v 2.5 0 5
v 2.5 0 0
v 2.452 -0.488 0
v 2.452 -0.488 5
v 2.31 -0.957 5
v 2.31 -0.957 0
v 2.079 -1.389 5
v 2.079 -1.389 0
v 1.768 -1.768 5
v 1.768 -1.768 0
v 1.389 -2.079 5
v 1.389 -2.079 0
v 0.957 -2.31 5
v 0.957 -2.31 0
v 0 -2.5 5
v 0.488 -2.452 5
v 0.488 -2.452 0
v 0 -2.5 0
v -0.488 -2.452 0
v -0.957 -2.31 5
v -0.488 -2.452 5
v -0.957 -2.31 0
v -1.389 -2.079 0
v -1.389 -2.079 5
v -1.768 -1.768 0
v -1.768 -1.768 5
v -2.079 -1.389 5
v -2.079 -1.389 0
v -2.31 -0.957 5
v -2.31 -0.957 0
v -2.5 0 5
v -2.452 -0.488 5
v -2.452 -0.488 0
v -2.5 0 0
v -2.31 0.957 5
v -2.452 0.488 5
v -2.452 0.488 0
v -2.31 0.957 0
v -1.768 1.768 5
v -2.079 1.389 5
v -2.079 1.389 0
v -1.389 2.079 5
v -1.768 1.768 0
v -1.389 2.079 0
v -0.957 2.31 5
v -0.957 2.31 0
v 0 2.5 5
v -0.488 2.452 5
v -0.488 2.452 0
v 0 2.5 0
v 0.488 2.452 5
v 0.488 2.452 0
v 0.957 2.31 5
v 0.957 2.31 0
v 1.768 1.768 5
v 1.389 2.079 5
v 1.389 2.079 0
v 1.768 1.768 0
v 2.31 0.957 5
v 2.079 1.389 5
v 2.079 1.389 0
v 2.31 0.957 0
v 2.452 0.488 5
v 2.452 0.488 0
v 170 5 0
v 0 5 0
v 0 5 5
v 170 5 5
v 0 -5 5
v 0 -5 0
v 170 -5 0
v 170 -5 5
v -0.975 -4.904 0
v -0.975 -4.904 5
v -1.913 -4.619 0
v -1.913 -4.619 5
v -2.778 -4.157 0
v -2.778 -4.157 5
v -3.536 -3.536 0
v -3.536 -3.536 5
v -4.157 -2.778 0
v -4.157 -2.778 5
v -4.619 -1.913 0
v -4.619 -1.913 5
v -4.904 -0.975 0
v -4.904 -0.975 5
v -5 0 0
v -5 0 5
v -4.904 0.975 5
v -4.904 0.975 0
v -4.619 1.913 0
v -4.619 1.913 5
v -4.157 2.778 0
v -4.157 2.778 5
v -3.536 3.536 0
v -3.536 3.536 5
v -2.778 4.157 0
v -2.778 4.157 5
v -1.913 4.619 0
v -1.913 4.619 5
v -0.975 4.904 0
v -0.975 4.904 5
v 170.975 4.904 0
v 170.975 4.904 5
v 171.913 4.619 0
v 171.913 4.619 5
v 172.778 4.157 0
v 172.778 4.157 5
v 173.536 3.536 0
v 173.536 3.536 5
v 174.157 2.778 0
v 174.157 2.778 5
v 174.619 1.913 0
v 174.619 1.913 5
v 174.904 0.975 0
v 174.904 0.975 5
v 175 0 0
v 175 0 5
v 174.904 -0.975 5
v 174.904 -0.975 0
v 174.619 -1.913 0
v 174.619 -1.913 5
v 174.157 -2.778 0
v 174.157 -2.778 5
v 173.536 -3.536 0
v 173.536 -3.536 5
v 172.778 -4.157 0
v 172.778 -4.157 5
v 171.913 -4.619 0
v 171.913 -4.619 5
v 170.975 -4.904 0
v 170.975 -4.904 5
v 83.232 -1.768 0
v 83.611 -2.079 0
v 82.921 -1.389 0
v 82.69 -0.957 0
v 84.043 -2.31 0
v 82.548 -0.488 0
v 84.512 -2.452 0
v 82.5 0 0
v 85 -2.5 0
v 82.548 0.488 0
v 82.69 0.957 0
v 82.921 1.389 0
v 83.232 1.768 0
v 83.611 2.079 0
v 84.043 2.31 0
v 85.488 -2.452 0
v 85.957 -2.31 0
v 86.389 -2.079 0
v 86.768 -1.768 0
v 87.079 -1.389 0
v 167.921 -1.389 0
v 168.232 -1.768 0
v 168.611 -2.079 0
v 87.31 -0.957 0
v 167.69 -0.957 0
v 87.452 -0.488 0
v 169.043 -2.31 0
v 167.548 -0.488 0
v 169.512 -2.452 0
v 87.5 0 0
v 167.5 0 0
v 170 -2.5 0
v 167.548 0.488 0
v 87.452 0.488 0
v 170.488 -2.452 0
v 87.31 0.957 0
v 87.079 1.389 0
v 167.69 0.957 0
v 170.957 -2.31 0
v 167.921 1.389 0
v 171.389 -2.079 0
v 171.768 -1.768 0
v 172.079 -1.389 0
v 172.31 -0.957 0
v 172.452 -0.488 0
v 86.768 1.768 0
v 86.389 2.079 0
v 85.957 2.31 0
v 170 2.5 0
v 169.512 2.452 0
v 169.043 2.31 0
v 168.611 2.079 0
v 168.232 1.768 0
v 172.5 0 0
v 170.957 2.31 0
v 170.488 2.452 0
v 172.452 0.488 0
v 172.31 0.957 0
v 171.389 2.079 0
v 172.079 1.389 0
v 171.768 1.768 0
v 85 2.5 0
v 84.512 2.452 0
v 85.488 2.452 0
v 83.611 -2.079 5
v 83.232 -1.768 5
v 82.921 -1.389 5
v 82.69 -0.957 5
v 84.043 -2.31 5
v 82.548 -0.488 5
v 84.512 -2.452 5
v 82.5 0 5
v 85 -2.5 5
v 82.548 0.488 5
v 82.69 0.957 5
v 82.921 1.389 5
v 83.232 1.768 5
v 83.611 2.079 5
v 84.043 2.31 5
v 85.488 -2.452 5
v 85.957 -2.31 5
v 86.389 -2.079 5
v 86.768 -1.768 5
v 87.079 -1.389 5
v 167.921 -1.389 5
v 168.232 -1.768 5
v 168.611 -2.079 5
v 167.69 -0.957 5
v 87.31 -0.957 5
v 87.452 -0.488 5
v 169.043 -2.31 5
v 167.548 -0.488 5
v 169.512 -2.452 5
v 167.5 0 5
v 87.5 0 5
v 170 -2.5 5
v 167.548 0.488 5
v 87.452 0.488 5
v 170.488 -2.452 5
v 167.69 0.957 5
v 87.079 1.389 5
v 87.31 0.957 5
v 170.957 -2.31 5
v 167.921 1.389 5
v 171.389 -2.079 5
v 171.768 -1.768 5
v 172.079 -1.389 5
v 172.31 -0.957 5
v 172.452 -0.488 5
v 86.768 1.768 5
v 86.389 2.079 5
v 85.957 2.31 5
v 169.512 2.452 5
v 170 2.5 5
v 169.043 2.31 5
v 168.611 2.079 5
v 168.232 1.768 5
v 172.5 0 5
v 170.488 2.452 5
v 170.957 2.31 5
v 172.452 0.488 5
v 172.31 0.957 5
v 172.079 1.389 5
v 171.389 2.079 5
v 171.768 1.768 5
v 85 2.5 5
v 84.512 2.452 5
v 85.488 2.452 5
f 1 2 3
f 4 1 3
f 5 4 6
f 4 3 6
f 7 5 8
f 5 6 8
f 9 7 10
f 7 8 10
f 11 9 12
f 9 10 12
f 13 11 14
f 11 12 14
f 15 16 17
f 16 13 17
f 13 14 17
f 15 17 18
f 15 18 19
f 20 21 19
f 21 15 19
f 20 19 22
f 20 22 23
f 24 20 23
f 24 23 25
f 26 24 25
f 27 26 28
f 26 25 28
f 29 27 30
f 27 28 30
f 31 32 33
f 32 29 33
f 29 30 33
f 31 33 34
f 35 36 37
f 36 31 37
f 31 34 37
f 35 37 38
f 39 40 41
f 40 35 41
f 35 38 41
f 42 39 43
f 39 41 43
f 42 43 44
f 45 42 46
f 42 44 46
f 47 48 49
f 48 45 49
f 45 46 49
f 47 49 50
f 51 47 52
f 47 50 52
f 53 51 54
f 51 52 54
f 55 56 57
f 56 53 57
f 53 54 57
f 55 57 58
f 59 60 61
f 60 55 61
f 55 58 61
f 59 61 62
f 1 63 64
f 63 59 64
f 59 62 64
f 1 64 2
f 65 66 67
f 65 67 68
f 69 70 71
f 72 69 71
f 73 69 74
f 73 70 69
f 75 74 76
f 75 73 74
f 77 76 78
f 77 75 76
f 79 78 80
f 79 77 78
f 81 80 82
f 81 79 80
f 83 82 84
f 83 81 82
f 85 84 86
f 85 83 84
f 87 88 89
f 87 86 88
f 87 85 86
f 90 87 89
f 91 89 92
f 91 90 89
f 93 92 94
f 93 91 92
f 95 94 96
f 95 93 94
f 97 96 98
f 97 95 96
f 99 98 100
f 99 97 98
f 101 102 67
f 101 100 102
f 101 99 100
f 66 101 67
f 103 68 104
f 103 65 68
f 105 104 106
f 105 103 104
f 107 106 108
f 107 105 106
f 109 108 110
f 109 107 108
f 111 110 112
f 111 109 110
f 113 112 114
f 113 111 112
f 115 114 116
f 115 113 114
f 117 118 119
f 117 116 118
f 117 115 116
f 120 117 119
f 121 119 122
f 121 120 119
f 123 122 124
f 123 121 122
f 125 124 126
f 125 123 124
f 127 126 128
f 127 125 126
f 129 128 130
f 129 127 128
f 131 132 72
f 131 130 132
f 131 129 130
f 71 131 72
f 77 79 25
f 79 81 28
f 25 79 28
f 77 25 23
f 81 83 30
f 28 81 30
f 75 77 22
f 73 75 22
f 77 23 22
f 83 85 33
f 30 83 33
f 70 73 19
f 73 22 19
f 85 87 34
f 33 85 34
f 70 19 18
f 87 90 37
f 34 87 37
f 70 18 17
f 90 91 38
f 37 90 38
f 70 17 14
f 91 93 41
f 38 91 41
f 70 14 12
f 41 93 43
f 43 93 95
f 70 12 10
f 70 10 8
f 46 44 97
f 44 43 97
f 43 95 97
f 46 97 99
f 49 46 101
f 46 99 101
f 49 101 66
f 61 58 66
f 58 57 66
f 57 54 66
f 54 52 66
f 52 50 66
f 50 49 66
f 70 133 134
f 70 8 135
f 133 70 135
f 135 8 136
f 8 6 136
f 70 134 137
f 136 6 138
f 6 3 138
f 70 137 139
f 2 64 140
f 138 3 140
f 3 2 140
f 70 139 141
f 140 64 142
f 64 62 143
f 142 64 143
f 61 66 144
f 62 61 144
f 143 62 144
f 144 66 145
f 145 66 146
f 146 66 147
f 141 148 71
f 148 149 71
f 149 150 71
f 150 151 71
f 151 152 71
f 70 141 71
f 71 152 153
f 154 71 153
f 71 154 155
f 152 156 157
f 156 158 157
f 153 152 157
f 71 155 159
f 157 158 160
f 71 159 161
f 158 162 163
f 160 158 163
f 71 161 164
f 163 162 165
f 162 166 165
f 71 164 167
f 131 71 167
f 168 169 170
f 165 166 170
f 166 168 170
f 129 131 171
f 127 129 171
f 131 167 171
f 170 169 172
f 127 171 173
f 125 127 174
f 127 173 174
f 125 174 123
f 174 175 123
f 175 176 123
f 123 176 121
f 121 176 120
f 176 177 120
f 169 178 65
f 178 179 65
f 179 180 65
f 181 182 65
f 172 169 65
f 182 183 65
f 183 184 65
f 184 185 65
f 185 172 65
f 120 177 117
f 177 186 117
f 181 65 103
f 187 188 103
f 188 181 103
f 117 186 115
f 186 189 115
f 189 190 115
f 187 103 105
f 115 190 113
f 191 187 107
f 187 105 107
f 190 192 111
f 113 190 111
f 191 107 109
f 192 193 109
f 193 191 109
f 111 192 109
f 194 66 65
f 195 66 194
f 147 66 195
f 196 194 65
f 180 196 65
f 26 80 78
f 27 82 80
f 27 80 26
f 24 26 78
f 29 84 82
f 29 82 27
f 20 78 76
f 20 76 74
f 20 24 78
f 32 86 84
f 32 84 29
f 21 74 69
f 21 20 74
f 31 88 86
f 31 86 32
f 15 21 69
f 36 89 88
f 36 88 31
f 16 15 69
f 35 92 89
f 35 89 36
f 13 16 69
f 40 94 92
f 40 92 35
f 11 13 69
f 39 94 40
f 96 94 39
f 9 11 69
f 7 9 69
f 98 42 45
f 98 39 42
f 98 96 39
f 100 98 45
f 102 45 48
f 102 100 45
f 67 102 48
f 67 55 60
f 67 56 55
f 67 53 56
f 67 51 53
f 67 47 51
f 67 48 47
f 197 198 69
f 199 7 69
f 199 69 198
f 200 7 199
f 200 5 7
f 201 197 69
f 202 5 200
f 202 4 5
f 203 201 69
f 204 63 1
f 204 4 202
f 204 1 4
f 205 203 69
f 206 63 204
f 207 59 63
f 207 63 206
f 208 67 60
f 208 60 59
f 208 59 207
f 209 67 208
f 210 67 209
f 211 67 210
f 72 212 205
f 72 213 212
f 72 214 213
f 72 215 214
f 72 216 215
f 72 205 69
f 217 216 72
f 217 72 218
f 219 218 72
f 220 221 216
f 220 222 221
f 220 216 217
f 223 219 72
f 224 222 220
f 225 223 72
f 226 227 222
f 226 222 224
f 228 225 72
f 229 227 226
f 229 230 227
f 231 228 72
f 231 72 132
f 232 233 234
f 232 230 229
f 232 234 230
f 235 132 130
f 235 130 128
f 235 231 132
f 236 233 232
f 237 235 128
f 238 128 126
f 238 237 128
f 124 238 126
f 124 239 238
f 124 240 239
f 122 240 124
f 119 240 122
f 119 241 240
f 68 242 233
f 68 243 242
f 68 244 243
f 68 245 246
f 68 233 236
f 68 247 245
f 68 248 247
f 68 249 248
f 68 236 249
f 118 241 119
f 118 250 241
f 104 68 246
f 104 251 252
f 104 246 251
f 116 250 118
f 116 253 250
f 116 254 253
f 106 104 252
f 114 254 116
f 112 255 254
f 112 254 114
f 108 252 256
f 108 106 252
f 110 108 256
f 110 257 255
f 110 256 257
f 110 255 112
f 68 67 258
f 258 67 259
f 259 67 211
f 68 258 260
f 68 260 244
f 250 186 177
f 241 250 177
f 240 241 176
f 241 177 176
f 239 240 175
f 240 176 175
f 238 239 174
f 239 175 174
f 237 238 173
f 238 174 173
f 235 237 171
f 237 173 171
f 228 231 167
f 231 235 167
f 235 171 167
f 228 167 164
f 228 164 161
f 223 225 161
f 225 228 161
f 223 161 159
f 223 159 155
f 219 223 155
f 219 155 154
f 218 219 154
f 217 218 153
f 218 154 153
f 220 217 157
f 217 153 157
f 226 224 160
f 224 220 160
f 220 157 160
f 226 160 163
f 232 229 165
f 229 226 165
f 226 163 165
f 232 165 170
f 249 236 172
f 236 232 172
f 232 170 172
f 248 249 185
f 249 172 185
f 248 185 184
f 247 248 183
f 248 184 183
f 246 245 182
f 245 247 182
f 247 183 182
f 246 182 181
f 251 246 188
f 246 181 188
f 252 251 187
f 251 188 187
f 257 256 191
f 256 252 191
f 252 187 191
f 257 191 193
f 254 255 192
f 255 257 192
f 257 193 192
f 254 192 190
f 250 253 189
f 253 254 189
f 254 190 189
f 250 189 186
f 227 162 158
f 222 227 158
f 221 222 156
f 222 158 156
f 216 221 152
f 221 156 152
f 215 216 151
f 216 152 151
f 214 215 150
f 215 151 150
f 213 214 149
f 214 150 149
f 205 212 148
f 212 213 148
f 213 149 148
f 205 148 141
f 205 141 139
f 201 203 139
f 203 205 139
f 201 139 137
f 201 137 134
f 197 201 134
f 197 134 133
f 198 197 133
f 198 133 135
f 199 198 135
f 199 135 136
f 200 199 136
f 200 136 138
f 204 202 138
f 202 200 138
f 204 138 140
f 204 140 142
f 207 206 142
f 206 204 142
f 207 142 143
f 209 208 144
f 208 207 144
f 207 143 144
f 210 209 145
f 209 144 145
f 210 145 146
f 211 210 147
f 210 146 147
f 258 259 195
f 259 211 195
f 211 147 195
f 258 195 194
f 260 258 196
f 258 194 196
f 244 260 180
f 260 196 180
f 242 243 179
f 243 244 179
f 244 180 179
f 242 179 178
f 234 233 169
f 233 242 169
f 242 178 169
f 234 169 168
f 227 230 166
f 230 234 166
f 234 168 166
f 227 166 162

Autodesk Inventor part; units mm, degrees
ref_plane "YZ Plane" through (0, 0, 0) normal (1, 0, 0) x (0, 1, 0)
ref_plane "XZ Plane" through (0, 0, 0) normal (0, 1, 0) x (-1, 0, 0)
ref_plane "XY Plane" through (0, 0, 0) normal (0, 0, 1) x (1, 0, 0)
sketch "Boceto1" plane through (0, 0, 0) normal (0, 0, 1) x (1, 0, 0)
  arc A0 (0, 5) -> (0, -5) centre (0, 0) ccw
  arc A1 (170, -5) -> (170, 5) centre (170, 0) ccw
  line L0 (0, 5) -> (170, 5)
  line L1 (0, -5) -> (170, -5)
  circle A2 centre (0, 0) radius 2.5
  circle A3 centre (170, 0) radius 2.5
  circle A4 centre (85, 0) radius 2.5
  dimension "d1" = 10
  dimension "d2" = 10
  dimension "d3" = 5
  dimension "d4" = 5
  dimension "d8" = 5
  dimension "d11" = 85
  dimension "d12" = 85
extrude "Extrusión1" add sketch "Boceto1" along normal blind 5
properties part number "Eslabon2"
